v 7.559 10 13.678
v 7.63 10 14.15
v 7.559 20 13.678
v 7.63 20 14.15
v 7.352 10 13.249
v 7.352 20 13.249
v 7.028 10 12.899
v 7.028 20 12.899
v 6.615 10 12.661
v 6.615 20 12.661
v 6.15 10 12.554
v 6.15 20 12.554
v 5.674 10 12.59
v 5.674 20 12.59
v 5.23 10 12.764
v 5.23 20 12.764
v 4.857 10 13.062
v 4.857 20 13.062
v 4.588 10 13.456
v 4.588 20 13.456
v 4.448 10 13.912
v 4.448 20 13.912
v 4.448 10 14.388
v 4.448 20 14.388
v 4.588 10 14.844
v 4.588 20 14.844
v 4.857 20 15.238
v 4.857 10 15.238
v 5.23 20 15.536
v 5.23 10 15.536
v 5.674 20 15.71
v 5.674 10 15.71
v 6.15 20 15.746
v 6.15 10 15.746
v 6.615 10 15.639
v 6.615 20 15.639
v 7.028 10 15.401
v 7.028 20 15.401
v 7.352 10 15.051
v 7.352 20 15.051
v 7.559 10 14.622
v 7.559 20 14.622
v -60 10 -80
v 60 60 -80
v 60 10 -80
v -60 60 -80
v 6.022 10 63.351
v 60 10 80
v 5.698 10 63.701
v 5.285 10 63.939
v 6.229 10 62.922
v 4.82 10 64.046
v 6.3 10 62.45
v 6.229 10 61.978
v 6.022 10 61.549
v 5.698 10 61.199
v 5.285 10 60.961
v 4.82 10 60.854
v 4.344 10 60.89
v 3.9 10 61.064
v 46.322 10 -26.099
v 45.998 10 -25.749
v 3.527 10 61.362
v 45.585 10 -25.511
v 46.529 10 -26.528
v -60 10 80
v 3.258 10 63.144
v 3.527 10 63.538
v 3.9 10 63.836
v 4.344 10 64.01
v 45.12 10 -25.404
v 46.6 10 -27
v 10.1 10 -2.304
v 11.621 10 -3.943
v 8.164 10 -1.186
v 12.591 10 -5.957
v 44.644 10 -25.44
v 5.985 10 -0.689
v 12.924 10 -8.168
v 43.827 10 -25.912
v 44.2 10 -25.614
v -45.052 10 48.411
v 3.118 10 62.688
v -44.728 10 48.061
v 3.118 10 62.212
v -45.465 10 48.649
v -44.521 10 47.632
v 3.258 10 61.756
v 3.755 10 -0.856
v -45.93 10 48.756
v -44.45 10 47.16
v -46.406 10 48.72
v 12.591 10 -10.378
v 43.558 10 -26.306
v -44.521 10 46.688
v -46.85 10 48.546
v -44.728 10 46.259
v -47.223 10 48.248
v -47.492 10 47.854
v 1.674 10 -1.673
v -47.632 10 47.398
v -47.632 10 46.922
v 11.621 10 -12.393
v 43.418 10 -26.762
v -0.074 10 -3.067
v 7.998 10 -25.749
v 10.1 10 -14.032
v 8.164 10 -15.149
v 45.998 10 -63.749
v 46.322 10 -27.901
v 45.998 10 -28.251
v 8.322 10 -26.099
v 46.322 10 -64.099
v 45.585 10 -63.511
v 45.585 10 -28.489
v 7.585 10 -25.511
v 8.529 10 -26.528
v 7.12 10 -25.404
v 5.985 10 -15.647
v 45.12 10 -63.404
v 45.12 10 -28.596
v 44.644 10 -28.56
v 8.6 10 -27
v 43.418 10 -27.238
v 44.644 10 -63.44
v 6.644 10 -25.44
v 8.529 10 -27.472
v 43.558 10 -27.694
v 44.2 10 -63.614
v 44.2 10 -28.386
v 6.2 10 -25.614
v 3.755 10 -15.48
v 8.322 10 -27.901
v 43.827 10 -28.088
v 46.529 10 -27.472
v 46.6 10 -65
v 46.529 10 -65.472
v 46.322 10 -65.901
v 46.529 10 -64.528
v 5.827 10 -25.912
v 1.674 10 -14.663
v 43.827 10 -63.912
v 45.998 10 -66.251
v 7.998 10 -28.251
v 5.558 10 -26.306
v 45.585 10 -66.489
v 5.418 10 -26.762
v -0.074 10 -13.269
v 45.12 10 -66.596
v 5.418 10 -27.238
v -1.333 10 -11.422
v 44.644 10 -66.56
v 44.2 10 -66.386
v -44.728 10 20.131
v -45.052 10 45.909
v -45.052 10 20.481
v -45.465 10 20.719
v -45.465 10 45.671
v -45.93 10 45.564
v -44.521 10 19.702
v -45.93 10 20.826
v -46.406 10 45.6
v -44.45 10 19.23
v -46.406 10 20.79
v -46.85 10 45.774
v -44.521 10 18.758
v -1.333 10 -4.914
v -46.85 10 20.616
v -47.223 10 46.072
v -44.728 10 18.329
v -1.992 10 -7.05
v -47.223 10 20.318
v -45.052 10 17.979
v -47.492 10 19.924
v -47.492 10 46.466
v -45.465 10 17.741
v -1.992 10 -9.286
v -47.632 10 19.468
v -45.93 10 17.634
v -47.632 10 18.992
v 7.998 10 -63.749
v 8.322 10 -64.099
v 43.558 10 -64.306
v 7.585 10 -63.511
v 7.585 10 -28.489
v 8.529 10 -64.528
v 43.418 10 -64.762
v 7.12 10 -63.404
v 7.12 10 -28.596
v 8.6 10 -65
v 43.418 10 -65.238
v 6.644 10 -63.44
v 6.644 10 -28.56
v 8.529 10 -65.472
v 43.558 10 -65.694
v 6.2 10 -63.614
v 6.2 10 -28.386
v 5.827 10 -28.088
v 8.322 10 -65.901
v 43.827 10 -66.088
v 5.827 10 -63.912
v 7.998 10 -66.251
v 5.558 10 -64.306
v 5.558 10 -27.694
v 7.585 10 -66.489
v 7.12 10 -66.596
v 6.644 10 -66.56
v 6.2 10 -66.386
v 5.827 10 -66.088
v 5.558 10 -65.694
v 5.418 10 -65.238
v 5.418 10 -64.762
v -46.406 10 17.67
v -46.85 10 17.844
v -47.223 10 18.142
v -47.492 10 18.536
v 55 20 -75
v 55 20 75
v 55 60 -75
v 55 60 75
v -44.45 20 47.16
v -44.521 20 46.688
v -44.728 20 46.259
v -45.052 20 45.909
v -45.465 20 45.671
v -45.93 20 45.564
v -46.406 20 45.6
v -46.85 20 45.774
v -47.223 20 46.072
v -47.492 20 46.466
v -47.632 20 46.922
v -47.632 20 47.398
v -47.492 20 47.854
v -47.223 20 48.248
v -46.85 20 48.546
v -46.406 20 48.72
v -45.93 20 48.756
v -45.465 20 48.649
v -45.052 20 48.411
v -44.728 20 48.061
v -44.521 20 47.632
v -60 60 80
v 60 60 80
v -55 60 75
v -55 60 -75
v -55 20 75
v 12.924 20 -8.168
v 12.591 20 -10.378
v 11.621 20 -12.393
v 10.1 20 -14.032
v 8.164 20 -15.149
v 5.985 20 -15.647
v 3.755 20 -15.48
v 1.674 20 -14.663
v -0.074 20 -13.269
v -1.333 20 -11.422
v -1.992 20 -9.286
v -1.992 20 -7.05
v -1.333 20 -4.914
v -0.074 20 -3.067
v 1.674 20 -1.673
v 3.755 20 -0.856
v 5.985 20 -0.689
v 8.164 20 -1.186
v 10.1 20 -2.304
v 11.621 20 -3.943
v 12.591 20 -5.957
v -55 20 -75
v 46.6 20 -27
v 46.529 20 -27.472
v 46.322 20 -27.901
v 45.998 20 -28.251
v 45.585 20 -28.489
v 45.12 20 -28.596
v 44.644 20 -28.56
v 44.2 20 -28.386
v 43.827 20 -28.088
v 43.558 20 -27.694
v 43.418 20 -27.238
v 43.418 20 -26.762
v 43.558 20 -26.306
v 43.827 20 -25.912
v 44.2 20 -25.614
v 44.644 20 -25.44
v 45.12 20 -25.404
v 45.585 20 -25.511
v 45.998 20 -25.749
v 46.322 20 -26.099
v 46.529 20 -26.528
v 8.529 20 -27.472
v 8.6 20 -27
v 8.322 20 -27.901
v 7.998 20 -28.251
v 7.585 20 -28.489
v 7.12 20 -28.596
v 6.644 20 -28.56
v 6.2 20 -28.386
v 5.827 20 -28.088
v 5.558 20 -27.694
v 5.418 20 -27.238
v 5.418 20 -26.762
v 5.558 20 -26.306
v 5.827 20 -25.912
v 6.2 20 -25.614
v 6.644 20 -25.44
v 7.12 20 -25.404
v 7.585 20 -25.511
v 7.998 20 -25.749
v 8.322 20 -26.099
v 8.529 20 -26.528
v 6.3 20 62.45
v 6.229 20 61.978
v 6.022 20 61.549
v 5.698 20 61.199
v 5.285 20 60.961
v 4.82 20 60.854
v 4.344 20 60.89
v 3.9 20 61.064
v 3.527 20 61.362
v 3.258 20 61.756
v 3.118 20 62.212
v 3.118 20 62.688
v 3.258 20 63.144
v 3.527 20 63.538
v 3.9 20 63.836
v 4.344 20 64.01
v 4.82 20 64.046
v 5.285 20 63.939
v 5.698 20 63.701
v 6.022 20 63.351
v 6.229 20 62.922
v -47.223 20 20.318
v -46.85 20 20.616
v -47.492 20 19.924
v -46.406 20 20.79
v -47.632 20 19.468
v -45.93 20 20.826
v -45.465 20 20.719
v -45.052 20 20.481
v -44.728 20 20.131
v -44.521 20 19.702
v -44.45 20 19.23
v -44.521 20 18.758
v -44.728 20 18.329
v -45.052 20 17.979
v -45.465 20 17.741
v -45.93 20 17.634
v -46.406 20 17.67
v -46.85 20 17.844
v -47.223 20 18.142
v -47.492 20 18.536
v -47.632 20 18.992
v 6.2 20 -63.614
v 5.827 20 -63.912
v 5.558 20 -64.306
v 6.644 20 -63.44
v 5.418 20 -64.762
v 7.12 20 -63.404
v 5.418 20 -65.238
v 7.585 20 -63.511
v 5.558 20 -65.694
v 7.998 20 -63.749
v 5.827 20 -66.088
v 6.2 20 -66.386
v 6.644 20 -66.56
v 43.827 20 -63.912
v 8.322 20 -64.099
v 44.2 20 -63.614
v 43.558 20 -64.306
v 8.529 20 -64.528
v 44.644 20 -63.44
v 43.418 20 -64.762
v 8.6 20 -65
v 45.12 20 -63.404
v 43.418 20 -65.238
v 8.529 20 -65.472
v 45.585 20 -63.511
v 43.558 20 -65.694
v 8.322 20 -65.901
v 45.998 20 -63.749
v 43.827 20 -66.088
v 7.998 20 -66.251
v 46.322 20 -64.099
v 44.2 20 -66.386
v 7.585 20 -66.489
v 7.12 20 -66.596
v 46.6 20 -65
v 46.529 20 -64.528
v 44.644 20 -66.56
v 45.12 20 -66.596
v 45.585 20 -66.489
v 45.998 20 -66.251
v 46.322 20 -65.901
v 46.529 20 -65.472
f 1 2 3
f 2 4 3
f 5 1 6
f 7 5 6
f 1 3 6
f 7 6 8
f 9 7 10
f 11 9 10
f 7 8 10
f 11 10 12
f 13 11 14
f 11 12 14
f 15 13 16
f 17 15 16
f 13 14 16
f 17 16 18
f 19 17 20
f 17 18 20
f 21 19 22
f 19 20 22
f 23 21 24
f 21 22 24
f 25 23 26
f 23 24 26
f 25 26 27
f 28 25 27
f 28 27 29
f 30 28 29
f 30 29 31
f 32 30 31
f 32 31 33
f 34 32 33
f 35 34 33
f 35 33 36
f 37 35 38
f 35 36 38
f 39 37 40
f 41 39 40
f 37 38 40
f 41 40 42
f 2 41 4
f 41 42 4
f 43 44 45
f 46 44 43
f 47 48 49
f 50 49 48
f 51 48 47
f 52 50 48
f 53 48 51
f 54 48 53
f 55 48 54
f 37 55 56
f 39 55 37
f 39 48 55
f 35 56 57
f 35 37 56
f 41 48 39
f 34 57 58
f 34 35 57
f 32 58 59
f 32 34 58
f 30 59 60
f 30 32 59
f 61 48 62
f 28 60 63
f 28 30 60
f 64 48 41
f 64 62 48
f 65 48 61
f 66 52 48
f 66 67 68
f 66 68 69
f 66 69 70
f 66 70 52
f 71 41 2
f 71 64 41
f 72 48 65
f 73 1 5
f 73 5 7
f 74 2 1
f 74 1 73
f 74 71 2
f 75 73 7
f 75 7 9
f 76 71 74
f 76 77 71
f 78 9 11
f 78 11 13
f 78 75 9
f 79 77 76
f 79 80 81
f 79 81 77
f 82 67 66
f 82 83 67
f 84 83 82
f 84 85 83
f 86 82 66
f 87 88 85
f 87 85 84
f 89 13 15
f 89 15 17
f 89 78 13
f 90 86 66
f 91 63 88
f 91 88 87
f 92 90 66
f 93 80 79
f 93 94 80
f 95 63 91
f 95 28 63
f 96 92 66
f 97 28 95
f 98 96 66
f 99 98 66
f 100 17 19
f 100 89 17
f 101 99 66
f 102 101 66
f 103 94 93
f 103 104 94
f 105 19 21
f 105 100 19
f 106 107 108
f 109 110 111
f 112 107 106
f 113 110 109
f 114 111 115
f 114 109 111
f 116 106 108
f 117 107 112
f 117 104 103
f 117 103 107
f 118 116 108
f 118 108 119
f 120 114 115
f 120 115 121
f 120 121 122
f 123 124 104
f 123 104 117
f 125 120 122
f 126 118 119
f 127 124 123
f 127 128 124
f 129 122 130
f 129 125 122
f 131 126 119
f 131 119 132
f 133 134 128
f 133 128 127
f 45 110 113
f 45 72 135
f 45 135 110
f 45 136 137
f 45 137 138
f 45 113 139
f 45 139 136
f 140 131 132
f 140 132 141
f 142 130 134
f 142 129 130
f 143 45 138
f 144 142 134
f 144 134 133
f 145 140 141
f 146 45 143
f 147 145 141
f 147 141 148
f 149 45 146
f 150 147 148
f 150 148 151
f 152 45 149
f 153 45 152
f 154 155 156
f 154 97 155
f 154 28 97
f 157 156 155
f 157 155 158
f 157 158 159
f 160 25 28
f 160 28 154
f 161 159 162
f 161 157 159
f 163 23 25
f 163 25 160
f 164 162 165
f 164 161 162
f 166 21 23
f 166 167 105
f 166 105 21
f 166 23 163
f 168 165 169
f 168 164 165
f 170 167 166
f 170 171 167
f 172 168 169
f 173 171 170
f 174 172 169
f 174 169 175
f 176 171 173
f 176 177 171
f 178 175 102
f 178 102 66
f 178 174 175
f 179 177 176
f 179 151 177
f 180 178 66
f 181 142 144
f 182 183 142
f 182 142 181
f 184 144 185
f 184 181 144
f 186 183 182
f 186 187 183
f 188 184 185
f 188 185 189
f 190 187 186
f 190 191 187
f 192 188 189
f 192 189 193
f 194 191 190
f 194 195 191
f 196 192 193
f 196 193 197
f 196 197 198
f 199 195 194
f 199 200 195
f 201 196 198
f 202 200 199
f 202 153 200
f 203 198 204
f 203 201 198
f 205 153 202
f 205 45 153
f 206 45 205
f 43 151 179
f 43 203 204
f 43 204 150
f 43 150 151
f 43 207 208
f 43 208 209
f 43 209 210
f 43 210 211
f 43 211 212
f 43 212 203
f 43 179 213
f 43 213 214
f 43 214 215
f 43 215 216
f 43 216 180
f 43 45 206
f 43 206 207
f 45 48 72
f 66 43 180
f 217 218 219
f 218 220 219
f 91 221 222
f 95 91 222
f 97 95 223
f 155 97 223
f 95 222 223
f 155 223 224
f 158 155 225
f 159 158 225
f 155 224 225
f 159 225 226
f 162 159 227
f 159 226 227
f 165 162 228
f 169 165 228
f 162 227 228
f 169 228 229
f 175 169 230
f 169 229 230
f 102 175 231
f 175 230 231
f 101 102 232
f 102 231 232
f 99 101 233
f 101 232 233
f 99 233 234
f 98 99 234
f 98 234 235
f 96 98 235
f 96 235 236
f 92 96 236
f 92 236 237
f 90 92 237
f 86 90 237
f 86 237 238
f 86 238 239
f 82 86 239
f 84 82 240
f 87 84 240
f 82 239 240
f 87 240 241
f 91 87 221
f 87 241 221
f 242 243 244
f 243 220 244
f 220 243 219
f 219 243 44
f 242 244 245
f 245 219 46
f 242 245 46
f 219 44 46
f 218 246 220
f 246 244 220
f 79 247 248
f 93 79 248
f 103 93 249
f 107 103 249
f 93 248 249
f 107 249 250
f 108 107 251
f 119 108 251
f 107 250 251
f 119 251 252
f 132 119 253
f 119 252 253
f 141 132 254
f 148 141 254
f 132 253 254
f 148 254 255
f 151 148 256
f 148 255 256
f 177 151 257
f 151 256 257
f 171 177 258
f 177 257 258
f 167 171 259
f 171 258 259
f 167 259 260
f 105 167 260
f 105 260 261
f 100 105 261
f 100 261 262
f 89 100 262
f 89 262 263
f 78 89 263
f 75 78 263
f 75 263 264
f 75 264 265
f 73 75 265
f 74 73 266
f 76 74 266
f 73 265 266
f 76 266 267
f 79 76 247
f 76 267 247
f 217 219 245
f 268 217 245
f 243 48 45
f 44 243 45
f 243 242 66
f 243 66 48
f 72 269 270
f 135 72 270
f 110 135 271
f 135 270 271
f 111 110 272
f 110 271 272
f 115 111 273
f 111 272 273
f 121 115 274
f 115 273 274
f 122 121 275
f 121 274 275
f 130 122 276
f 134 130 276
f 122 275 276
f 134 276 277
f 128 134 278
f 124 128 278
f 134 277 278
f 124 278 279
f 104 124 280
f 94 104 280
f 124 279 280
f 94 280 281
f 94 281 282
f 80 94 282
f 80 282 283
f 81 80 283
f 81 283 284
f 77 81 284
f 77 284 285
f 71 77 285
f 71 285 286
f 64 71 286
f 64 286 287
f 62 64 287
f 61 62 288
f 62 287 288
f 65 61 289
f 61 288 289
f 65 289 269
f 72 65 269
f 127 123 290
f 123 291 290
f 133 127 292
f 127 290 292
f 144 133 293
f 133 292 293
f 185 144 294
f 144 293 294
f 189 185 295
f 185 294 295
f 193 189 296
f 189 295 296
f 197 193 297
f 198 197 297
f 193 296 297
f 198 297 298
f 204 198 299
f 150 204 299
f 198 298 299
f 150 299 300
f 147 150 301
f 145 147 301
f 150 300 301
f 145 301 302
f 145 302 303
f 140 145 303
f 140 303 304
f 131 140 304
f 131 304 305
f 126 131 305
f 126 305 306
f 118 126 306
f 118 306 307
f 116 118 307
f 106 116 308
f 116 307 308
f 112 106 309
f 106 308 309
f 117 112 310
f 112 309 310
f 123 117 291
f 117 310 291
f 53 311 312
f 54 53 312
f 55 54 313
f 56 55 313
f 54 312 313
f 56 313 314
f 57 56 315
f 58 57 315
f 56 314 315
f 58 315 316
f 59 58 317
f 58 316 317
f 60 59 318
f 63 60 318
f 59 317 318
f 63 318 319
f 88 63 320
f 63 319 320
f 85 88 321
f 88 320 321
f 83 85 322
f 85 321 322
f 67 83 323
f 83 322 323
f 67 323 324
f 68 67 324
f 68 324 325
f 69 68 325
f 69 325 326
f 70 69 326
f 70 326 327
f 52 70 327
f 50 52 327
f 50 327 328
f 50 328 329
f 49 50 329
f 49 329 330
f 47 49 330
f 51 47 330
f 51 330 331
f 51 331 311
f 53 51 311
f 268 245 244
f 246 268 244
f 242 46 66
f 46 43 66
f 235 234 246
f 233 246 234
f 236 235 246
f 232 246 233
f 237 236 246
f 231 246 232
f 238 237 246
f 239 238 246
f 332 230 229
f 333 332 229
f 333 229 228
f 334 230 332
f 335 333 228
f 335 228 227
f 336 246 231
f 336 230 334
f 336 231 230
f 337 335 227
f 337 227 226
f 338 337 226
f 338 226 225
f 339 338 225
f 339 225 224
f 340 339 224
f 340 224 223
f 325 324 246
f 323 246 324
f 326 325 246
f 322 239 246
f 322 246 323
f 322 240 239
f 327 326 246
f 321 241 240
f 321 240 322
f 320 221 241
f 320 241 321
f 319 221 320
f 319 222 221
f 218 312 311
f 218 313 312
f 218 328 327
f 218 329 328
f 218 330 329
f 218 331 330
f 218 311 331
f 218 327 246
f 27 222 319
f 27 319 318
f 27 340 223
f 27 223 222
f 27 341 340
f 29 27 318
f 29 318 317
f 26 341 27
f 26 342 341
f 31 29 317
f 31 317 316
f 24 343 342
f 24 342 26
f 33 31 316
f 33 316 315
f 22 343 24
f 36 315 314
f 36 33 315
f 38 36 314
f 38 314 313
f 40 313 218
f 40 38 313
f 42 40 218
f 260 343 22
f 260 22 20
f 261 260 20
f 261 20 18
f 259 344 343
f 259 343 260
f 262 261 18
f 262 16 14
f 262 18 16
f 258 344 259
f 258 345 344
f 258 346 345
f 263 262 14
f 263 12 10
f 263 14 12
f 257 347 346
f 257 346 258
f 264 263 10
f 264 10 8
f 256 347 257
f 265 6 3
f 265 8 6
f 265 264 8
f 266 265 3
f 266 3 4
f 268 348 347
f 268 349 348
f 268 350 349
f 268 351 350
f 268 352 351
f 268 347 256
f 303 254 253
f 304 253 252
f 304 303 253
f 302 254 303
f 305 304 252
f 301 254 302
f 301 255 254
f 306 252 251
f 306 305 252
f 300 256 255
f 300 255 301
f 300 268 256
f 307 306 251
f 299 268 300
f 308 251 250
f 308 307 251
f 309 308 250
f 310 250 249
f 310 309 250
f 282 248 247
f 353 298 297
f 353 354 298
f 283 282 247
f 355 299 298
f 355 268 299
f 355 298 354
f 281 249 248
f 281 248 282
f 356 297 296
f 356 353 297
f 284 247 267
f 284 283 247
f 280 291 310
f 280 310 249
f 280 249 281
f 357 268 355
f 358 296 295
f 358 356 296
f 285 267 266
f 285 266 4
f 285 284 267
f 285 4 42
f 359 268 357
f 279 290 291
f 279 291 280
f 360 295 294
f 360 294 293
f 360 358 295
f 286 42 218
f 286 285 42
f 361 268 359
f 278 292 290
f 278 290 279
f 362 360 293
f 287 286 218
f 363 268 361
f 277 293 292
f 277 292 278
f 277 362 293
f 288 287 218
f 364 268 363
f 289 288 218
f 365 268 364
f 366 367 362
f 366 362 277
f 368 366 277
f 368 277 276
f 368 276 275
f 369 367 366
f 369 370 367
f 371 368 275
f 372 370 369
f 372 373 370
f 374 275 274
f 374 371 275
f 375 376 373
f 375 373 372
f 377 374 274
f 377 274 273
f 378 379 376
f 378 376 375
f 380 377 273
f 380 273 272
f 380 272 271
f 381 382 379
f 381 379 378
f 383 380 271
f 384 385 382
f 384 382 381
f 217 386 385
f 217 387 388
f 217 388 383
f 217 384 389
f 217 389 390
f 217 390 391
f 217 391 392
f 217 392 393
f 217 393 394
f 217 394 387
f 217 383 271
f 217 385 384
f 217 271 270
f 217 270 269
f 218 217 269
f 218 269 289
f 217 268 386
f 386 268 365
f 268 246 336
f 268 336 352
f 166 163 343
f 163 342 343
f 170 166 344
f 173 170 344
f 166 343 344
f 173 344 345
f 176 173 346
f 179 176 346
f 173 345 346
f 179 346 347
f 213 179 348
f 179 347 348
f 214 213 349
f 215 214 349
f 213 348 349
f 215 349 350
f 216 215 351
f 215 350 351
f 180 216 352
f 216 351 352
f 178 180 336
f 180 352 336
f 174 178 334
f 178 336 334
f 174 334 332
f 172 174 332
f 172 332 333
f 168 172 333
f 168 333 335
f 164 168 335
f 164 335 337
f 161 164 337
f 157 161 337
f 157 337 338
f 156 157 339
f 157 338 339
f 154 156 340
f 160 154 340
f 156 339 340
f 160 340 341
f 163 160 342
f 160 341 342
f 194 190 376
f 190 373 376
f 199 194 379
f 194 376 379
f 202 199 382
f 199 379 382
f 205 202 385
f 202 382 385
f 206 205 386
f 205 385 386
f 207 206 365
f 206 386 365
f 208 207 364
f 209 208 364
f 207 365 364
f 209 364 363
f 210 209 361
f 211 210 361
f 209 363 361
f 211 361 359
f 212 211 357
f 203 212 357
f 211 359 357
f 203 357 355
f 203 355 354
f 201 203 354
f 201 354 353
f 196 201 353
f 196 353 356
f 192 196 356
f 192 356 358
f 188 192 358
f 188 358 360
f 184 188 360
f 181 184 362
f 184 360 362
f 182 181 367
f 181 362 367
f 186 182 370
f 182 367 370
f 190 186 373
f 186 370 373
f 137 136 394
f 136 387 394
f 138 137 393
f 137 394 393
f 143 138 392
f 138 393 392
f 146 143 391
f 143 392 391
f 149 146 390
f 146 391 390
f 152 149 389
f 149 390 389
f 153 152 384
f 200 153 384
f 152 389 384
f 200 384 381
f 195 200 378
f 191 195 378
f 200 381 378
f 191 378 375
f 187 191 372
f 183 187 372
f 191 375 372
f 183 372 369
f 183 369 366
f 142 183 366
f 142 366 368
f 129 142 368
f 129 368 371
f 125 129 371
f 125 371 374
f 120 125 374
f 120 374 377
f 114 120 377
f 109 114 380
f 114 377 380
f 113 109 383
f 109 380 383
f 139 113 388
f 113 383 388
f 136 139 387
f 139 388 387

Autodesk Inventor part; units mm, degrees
ref_plane "YZ Plane" through (0, 0, 0) normal (1, 0, 0) x (0, 1, 0)
ref_plane "XZ Plane" through (0, 0, 0) normal (0, 1, 0) x (-1, 0, 0)
ref_plane "XY Plane" through (0, 0, 0) normal (0, 0, 1) x (1, 0, 0)
sketch "스케치1" plane through (0, 0, 0) normal (0, 1, 0) x (-1, 0, 0)
  line L0 (60, 80) -> (-60, 80)
  line L1 (-60, 80) -> (-60, -80)
  line L2 (-60, -80) -> (60, -80)
  line L3 (60, -80) -> (60, 80)
  line L4 (60, 80) -> (-60, -80) construction
  line L5 (-60, 80) -> (60, -80) construction
  point P0 (0, 0)
  dimension "d0" = 120
  dimension "d1" = 160
extrude "돌출1" add sketch "스케치1" along normal blind 60
sketch "스케치2" plane through (0, 60, 0) normal (0, 1, 0) x (1, 0, 0)
  line L0 (60, -80) -> (60, 80) projected
  line L1 (60, 80) -> (-60, 80) projected
  line L2 (55, 102.1646) -> (-55, 102.1646)
  line L3 (-55, 102.1646) -> (-55, -89.711)
  line L4 (-55, -89.711) -> (55, -89.711)
  line L5 (55, -89.711) -> (55, 102.1646)
  line L6 (-60, 80) -> (-60, -80) projected
  point P0 (0, 0)
  point P1 (55, 80)
  point P2 (-55, 80)
  dimension "d6" = 5
  dimension "d7" = 5
extrude "돌출2" cut sketch "스케치2" against normal blind 40 contours L5 L4 L3 L1
sketch "스케치12" plane through (60, 0, -80) normal (0, 0, -1) x (-1, 0, 0)
  line L0 (-34.8463, 10) -> (156.2634, 10)
  line L1 (156.2634, 10) -> (156.2634, -36.9465)
  line L2 (156.2634, -36.9465) -> (-34.8463, -36.9465)
  line L3 (-34.8463, -36.9465) -> (-34.8463, 10)
  line L4 (0, 0) -> (120, 0) projected
  point P0 (60, 0)
  dimension "d85" = 10
extrude "돌출10" cut sketch "스케치12" against normal through all
sketch "스케치13" plane through (-55, 20, 80) normal (0, 0, 1) x (1, 0, 0)
  line L0 (0, 40) -> (0, 0) projected
  line L1 (0, 0) -> (110, 0) projected
  line L2 (0, 40) -> (110, 40)
  line L3 (110, 40) -> (110, 0)
  line L4 (110, 0) -> (0, 0)
  line L5 (0, 0) -> (0, 40)
  point P0 (55, -20)
extrude "돌출11" add sketch "스케치13" against normal blind 5
sketch "스케치14" plane through (55, 20, -80) normal (0, 0, -1) x (-1, 0, 0)
  line L0 (0, 0) -> (0, 40) projected
  line L1 (110, 0) -> (0, 0) projected
  line L2 (0, 40) -> (110, 40)
  line L3 (110, 40) -> (110, 0)
  line L4 (110, 0) -> (0, 0)
  line L5 (0, 0) -> (0, 40)
  point P0 (55, -20)
extrude "돌출12" add sketch "스케치14" against normal blind 5
sketch "스케치15" plane through (60, 60, -80) normal (0, 0, -1) x (-1, 0, 0)
  point P0 (60, -60)
sketch "스케치16" plane through (60, 60, -80) normal (0, 0, -1) x (-1, 0, 0)
  point P0 (60, -60)
sketch "스케치17" plane through (0, 20, 0) normal (0, 1, 0) x (1, 0, 0)
  line L0 (7, 27) -> (45, 27)
  line L1 (45, 27) -> (45, 65)
  line L2 (45, 65) -> (7, 65)
  line L3 (7, 65) -> (7, 27)
  line L4 (55, 75) -> (55, -75) projected
  line L5 (55, 75) -> (-55, 75) projected
  circle A0 centre (7, 27) radius 1.6
  circle A1 centre (7, 65) radius 1.6
  circle A2 centre (45, 65) radius 1.6
  circle A3 centre (45, 27) radius 1.6
  line L6 (-47.9371, 14.7215) -> (-7.9371, 14.7215)
  line L7 (-7.9371, 14.7215) -> (-7.9371, 64.7215)
  line L8 (-7.9371, 64.7215) -> (-47.9371, 64.7215)
  line L9 (-47.9371, 64.7215) -> (-47.9371, 14.7215)
  point P0 (0, 0)
  dimension "d92" = 38
  dimension "d93" = 38
  dimension "d95" = 10
  dimension "d96" = 10
  dimension "d97" = 3.2
  dimension "d98" = 3.2
  dimension "d99" = 3.2
  dimension "d100" = 3.2
  dimension "d113" = 40
  dimension "d114" = 50
extrude "돌출13" cut sketch "스케치17" against normal through all contours L3 A0 L0 | L0 A0 L3 | A3 L1 L0 | L0 L1 A3 | A1 L2 L3 | L3 L2 A1 | A2 L2 L1 | L1 L2 A2
sketch "스케치21" plane through (0, 20, 0) normal (0, 1, 0) x (1, 0, 0)
  circle A0 centre (5.4243, 8.1678) radius 7.5
  line L0 (-49.3888, 17.2731) -> (-9.3888, 17.2731)
  line L1 (-9.3888, 17.2731) -> (-9.3888, 67.2731)
  line L2 (-9.3888, 67.2731) -> (-49.3888, 67.2731)
  line L3 (-49.3888, 67.2731) -> (-49.3888, 17.2731)
  point P0 (0, 0)
  dimension "d117" = 15
  dimension "d118" = 50
  dimension "d119" = 40
extrude "돌출15" cut sketch "스케치21" against normal through all contours A0
sketch "스케치23" plane through (0, 20, 0) normal (0, 1, 0) x (1, 0, 0)
  line L0 (-48.6, -65) -> (20, -65)
  line L1 (20, -65) -> (20, -11.6)
  line L2 (20, -11.6) -> (-48.6, -11.6)
  line L3 (-48.6, -11.6) -> (-48.6, -65)
  line L4 (55, 75) -> (55, -75) projected
  line L5 (-55, -75) -> (55, -75) projected
  circle A0 centre (4.7, -62.45) radius 1.6
  circle A1 centre (6.03, -14.15) radius 1.6
  circle A2 centre (-46.05, -47.16) radius 1.6
  circle A3 centre (-46.05, -19.23) radius 1.6
  point P0 (0, 0)
  dimension "d123" = 68.6
  dimension "d124" = 53.4
  dimension "d125" = 35
  dimension "d126" = 10
  dimension "d127" = 3.2
  dimension "d128" = 15.3
  dimension "d129" = 2.55
  dimension "d130" = 3.2
  dimension "d131" = 13.97
  dimension "d132" = 2.55
  dimension "d133" = 3.2
  dimension "d134" = 35.56
  dimension "d135" = 3.2
  dimension "d136" = 2.55
  dimension "d137" = 2.55
  dimension "d138" = 7.63
extrude "돌출16" cut sketch "스케치23" against normal through all contours A0 | A1 | A2 | A3
properties part number "본체 회전"
